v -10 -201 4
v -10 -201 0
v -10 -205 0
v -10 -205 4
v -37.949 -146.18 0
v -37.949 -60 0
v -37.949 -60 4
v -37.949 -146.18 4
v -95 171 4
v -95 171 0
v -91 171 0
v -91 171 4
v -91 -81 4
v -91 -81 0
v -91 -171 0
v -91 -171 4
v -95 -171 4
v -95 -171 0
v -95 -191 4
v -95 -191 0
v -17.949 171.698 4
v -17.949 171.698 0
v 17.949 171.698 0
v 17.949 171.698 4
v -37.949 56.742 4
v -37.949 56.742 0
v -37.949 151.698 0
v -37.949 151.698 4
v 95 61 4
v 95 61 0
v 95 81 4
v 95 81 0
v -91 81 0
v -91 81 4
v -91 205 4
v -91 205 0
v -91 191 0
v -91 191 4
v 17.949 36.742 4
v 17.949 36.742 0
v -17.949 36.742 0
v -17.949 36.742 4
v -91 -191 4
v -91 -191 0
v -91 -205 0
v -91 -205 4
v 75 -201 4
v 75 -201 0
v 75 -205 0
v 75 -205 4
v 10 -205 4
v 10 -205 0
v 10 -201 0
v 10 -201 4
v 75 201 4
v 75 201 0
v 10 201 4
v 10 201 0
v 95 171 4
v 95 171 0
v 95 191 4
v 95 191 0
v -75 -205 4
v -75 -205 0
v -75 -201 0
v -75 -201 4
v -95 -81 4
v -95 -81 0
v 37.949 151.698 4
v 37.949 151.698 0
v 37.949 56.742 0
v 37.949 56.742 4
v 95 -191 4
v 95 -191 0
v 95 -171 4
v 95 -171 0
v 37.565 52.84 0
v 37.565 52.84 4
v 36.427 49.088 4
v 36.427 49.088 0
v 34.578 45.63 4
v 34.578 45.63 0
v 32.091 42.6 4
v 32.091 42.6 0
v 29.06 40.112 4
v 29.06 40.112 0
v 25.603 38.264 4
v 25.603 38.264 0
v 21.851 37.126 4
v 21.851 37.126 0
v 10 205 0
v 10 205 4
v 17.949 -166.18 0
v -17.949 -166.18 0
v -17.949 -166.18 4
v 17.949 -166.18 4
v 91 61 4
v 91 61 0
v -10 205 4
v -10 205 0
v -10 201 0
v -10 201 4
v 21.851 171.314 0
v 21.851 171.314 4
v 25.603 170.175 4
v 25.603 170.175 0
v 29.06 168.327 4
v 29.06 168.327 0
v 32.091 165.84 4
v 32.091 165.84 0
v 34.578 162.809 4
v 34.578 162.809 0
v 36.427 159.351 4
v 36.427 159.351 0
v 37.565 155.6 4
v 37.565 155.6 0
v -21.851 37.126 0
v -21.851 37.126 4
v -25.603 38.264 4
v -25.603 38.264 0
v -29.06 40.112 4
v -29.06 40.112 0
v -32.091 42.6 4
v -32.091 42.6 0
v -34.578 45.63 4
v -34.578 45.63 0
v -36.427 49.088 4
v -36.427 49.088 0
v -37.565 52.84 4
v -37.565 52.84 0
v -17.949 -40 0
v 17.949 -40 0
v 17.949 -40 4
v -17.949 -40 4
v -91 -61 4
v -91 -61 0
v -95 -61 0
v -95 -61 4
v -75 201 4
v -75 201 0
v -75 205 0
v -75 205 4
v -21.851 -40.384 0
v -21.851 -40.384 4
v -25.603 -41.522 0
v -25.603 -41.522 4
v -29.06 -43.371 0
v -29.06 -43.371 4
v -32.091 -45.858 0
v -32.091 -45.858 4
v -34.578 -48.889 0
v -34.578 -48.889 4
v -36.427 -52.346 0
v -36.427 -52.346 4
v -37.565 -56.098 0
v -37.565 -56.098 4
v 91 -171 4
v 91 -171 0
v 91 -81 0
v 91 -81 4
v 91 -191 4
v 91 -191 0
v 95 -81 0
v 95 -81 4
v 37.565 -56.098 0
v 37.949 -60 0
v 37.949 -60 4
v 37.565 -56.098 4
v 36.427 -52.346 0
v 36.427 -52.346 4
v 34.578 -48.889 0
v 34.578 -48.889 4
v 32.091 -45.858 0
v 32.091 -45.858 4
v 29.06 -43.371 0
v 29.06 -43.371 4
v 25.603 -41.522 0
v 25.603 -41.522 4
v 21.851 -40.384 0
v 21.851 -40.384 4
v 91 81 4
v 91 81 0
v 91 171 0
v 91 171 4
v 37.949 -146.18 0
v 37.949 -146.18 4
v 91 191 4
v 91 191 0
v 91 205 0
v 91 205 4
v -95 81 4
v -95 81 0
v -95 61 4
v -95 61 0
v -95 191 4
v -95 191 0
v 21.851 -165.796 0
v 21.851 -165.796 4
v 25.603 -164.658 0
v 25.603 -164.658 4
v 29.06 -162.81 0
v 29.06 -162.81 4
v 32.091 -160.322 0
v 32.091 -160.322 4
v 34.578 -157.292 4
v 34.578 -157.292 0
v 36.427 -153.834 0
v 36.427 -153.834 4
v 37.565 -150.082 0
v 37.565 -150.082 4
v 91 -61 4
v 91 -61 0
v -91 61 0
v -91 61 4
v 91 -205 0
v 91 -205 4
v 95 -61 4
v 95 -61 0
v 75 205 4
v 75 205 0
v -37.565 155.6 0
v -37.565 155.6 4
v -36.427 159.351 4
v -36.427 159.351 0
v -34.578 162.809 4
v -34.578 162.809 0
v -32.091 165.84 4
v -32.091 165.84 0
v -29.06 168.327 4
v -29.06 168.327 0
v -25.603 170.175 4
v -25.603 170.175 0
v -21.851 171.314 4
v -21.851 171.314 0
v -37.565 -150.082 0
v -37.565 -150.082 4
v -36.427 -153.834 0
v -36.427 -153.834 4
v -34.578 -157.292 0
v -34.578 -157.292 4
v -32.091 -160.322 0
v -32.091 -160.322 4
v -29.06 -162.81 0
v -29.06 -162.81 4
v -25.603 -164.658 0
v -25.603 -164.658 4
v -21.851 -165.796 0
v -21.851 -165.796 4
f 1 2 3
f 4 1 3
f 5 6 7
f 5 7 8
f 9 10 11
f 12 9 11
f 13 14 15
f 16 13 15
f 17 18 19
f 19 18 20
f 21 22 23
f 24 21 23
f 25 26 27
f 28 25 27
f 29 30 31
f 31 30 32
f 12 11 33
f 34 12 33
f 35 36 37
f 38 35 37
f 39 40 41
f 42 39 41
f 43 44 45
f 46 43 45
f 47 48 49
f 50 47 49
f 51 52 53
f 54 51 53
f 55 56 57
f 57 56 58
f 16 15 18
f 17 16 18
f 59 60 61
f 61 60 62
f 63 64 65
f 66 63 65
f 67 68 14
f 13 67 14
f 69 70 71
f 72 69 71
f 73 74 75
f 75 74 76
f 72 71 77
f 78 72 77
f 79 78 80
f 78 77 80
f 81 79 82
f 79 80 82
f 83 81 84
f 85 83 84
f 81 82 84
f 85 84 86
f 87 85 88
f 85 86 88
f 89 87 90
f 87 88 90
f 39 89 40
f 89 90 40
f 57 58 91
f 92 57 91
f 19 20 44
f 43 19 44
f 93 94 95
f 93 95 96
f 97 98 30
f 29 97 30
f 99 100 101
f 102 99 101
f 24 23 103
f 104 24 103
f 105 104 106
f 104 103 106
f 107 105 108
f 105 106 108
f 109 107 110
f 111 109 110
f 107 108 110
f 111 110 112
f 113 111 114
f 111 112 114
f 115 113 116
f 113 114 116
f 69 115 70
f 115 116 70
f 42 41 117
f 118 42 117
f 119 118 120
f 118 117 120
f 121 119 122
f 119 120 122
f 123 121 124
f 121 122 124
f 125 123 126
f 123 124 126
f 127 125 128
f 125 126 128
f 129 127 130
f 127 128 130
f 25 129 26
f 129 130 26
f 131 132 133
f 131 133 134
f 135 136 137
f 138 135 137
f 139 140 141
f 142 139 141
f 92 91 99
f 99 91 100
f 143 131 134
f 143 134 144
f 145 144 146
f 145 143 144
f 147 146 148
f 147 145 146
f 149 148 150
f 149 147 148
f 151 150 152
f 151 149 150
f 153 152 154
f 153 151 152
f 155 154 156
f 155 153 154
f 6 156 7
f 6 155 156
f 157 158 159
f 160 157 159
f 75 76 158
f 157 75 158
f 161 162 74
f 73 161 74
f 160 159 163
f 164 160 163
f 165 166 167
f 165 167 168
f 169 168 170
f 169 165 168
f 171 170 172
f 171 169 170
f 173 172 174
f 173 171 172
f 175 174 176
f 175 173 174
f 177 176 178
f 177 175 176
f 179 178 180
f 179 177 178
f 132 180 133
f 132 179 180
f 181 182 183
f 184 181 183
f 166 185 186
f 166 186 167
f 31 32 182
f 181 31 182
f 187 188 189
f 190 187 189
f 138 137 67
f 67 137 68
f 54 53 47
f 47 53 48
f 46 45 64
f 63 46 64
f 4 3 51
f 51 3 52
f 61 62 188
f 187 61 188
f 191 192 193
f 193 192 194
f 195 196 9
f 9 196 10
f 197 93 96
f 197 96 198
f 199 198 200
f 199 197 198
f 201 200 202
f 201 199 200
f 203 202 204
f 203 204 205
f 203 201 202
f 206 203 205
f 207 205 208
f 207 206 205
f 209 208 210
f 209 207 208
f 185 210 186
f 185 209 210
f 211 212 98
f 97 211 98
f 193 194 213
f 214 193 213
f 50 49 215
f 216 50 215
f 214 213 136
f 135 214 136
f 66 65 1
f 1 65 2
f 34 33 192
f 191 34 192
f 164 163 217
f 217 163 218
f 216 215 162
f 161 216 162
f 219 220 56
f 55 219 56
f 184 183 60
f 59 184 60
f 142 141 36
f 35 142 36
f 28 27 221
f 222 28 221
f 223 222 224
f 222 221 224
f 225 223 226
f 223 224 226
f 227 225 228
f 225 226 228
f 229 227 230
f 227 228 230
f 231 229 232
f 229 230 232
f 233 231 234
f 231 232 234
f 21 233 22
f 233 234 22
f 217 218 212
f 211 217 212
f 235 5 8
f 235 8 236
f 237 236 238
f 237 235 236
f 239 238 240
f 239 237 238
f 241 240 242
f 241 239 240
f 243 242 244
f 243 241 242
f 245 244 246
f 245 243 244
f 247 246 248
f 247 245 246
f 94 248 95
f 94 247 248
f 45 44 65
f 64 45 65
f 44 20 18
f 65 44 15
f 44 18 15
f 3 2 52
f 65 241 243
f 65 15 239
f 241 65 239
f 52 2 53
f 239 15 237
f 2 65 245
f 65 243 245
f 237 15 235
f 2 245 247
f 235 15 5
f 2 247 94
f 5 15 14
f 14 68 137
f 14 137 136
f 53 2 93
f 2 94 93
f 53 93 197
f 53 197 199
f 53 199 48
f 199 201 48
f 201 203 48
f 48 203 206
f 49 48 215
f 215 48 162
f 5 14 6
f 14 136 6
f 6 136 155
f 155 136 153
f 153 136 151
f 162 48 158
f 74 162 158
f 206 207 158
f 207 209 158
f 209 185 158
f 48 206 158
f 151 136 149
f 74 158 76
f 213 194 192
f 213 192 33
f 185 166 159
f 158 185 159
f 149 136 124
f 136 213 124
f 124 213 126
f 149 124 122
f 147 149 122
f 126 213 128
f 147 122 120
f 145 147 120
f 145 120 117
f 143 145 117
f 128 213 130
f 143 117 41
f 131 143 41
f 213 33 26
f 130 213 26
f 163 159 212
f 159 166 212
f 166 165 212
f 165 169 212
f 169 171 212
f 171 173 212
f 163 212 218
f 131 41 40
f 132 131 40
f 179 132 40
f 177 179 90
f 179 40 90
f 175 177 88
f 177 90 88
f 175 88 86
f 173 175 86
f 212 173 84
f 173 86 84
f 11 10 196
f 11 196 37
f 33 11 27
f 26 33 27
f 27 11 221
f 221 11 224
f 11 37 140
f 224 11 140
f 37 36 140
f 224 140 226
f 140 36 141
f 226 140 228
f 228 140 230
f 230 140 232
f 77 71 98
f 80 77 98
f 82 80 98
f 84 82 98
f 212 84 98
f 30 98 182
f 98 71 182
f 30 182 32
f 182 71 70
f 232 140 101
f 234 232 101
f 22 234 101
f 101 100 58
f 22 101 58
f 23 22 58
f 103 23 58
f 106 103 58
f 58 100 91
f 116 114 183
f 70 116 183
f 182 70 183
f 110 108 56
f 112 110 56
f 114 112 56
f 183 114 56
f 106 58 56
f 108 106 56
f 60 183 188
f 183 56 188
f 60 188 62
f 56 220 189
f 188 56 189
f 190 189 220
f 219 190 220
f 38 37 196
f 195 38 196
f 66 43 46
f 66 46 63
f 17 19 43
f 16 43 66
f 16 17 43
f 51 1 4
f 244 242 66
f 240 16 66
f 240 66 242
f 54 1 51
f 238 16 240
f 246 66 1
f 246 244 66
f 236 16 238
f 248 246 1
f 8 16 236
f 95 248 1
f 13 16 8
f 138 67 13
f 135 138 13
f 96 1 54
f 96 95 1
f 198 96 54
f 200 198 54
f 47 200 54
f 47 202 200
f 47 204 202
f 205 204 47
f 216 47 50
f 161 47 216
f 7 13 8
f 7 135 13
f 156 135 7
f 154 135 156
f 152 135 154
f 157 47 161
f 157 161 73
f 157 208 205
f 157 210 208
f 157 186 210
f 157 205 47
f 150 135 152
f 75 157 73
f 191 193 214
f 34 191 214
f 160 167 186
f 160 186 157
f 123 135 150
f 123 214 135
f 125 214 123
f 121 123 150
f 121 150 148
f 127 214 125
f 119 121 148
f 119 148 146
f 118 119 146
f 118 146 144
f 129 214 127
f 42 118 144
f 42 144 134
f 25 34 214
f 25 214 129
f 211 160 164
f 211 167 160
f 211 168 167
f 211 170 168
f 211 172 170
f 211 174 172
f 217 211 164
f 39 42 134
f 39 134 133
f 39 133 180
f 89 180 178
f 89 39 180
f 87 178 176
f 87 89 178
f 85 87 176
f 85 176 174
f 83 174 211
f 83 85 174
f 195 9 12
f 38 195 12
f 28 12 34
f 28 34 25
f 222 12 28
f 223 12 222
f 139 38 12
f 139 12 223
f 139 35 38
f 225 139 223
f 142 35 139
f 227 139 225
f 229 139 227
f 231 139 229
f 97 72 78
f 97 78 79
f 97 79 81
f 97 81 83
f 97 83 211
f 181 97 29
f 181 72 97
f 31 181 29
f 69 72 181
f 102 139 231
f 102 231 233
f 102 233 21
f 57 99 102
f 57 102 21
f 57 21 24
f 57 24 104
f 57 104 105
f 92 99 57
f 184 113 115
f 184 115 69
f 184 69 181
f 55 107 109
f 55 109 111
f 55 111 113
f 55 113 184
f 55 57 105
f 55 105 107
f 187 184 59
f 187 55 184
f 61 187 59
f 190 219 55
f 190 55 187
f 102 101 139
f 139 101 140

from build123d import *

# Parameters (mm, degrees)
BOSS_EXTRUDE2_DEPTH = 4


with BuildPart() as part:
    # Sketch1 → Boss-Extrude2 (new body)
    with BuildSketch(Plane.XY):
        Polygon((-75, -201), (-10, -201), (-10, -205), (10, -205), (10, -201), (75, -201), (75, -205), (91, -205), (91, -191), (95, -191), (95, -171), (91, -171), (91, -81), (95, -81), (95, -61), (91, -61), (91, 61), (95, 61), (95, 81), (91, 81), (91, 171), (95, 171), (95, 191), (91, 191), (91, 205), (75, 205), (75, 201), (10, 201), (10, 205), (-10, 205), (-10, 201), (-75, 201), (-75, 205), (-91, 205), (-91, 191), (-95, 191), (-95, 171), (-91, 171), (-91, 81), (-95, 81), (-95, 61), (-91, 61), (-91, -61), (-95, -61), (-95, -81), (-91, -81), (-91, -171), (-95, -171), (-95, -191), (-91, -191), (-91, -205), (-75, -205), align=None)
        with BuildLine():
            Line((-17.949055326, 171.697819396), (17.949055326, 171.697819396))
            ThreePointArc((17.949055326, 171.697819396), (32.09119095, 165.83995502), (37.949055326, 151.697819396))
            Line((37.949055326, 151.697819396), (37.949055326, 56.741742537))
            ThreePointArc((37.949055326, 56.741742537), (32.09119095, 42.599606914), (17.949055326, 36.741742537))
            Line((17.949055326, 36.741742537), (-17.949055326, 36.741742537))
            ThreePointArc((-17.949055326, 36.741742537), (-32.09119095, 42.599606914), (-37.949055326, 56.741742537))
            Line((-37.949055326, 56.741742537), (-37.949055326, 151.697819396))
            ThreePointArc((-37.949055326, 151.697819396), (-32.09119095, 165.83995502), (-17.949055326, 171.697819396))
        make_face(mode=Mode.SUBTRACT)
        with BuildLine():
            Line((-17.949055326, -166.180135652), (17.949055326, -166.180135652))
            ThreePointArc((17.949055326, -166.180135652), (32.09119095, -160.322271276), (37.949055326, -146.180135652))
            Line((37.949055326, -146.180135652), (37.949055326, -60))
            ThreePointArc((37.949055326, -60), (32.09119095, -45.857864376), (17.949055326, -40))
            Line((17.949055326, -40), (-17.949055326, -40))
            ThreePointArc((-17.949055326, -40), (-32.09119095, -45.857864376), (-37.949055326, -60))
            Line((-37.949055326, -60), (-37.949055326, -146.180135652))
            ThreePointArc((-37.949055326, -146.180135652), (-32.09119095, -160.322271276), (-17.949055326, -166.180135652))
        make_face(mode=Mode.SUBTRACT)
    extrude(amount=BOSS_EXTRUDE2_DEPTH)


solid = part.part
